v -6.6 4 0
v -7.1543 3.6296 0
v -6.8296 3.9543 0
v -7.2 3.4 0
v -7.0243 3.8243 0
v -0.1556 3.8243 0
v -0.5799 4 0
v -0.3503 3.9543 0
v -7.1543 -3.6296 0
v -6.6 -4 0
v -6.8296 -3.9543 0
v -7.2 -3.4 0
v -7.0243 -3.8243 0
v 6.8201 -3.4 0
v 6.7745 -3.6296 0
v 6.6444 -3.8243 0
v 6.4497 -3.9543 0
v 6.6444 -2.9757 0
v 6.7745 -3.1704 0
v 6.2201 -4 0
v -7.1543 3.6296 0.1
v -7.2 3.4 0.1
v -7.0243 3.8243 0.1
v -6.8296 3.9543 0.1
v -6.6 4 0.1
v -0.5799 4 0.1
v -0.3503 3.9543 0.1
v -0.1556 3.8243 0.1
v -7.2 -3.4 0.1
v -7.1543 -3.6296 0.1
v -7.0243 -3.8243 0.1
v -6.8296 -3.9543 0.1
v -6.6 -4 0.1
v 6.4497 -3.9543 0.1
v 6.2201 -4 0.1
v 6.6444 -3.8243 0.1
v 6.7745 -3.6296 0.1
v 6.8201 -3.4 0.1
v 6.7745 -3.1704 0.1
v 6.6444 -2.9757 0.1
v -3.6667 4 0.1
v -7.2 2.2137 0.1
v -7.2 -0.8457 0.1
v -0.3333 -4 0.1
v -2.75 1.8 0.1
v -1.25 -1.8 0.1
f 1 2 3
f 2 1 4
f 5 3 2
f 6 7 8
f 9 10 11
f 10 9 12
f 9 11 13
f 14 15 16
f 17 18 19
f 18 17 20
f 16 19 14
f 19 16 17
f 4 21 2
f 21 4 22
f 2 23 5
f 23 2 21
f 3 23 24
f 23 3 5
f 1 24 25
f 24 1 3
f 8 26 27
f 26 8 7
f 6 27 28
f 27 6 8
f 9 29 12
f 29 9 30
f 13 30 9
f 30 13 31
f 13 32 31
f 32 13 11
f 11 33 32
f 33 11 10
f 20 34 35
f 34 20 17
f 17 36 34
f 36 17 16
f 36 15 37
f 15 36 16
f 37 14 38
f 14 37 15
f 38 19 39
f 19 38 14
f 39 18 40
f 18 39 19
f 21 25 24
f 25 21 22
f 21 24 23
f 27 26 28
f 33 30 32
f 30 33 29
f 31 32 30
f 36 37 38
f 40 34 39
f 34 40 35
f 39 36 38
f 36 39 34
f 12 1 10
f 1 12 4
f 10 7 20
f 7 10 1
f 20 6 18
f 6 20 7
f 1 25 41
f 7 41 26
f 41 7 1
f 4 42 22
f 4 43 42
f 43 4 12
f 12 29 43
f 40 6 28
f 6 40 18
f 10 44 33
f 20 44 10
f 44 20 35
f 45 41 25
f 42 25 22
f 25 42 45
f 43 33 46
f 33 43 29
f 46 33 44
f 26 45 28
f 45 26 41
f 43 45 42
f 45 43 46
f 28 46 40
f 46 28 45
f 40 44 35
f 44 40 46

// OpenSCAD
// file: ../p/3-8cyli.scad
use <../lib.scad>
function ldraw_lib__3_8cyli() = [
// 0 Cylinder 0.375
// 0 Name: 3-8cyli.dat
// 0 Author: James Jessiman
// 0 !LDRAW_ORG Primitive UPDATE 2005-01
// 0 !LICENSE Licensed under CC BY 4.0 : see CAreadme.txt
// 
// 0 BFC CERTIFY CCW
  [0,"BFC","CERTIFY"],
  [0,"BFC","CCW"],
// 
// 0 !HISTORY 2002-05-08 [OrionP] Made BFC compliant
// 0 !HISTORY 2002-08-18 [PTadmin] Official Update 2002-04
// 0 !HISTORY 2004-12-11 [nielsk] Recreated using Primitive Generator, Edge lines fixed, BFC changed to CCW
// 0 !HISTORY 2005-12-28 [PTadmin] Official Update 2005-01
// 0 !HISTORY 2007-06-24 [PTadmin] Header formatted for Contributor Agreement
// 0 !HISTORY 2008-07-01 [PTadmin] Official Update 2008-01
// 
// 
// 4 16 .9239 1 .3827 .9239 0 .3827 1 0 0 1 1 0
  [4,16,.9239,1,.3827,.9239,0,.3827,1,0,0,1,1,0],
// 4 16 .7071 1 .7071 .7071 0 .7071 .9239 0 .3827 .9239 1 .3827
  [4,16,.7071,1,.7071,.7071,0,.7071,.9239,0,.3827,.9239,1,.3827],
// 4 16 .3827 1 .9239 .3827 0 .9239 .7071 0 .7071 .7071 1 .7071
  [4,16,.3827,1,.9239,.3827,0,.9239,.7071,0,.7071,.7071,1,.7071],
// 4 16 0 1 1 0 0 1 .3827 0 .9239 .3827 1 .9239
  [4,16,0,1,1,0,0,1,.3827,0,.9239,.3827,1,.9239],
// 4 16 -.3827 1 .9239 -.3827 0 .9239 0 0 1 0 1 1
  [4,16,-.3827,1,.9239,-.3827,0,.9239,0,0,1,0,1,1],
// 4 16 -.7071 1 .7071 -.7071 0 .7071 -.3827 0 .9239 -.3827 1 .9239
  [4,16,-.7071,1,.7071,-.7071,0,.7071,-.3827,0,.9239,-.3827,1,.9239],
// 5 24 1 1 0 1 0 0 1 1 -.4142 .9239 1 .3827
  [5,24,1,1,0,1,0,0,1,1,-.4142,.9239,1,.3827],
// 5 24 .9239 1 .3827 .9239 0 .3827 1 1 0 .7071 1 .7071
  [5,24,.9239,1,.3827,.9239,0,.3827,1,1,0,.7071,1,.7071],
// 5 24 .7071 1 .7071 .7071 0 .7071 .9239 1 .3827 .3827 1 .9239
  [5,24,.7071,1,.7071,.7071,0,.7071,.9239,1,.3827,.3827,1,.9239],
// 5 24 .3827 1 .9239 .3827 0 .9239 .7071 1 .7071 0 1 1
  [5,24,.3827,1,.9239,.3827,0,.9239,.7071,1,.7071,0,1,1],
// 5 24 0 1 1 0 0 1 .3827 1 .9239 -.3827 1 .9239
  [5,24,0,1,1,0,0,1,.3827,1,.9239,-.3827,1,.9239],
// 5 24 -.3827 1 .9239 -.3827 0 .9239 0 1 1 -.7071 1 .7071
  [5,24,-.3827,1,.9239,-.3827,0,.9239,0,1,1,-.7071,1,.7071],
// 5 24 -.7071 1 .7071 -.7071 0 .7071 -.3827 1 .9239 -1 1 .4142
  [5,24,-.7071,1,.7071,-.7071,0,.7071,-.3827,1,.9239,-1,1,.4142],
// 0
];
module ldraw_lib__3_8cyli(step=0, col=false, unit=2/5, alt=false, line=0.2, solid=!$preview)
    makepoly(ldraw_lib__3_8cyli(), step=step, col=col, unit=unit, alt=alt, line=line, solid=solid);
ldraw_lib__3_8cyli(line=0.2);
// file: ../p/3-8chrd.scad
use <../lib.scad>
function ldraw_lib__3_8chrd() = [
// 0 Chord 0.375
// 0 Name: 3-8chrd.dat
// 0 Author: Donald Sutter [technog]
// 0 !LDRAW_ORG Primitive UPDATE 2005-01
// 0 !LICENSE Licensed under CC BY 4.0 : see CAreadme.txt
// 
// 0 BFC CERTIFY CCW
  [0,"BFC","CERTIFY"],
  [0,"BFC","CCW"],
// 
// 0 !HISTORY 2004-01-07 [Steffen] added primitive code for POVray
// 0 !HISTORY 2004-03-18 [mkennedy] removed pov code and rearanged polygons.
// 0 !HISTORY 2004-09-12 [cwdee] reversed winding and standardised precision
// 0 !HISTORY 2005-12-28 [PTadmin] Official Update 2005-01
// 0 !HISTORY 2007-06-24 [PTadmin] Header formatted for Contributor Agreement
// 0 !HISTORY 2008-07-01 [PTadmin] Official Update 2008-01
// 
// 
// 3 16 0.7071 0 0.7071 0.3827 0 0.9239 0 0 1
  [3,16,0.7071,0,0.7071,0.3827,0,0.9239,0,0,1],
// 4 16 0.9239 0 0.3827 -0.3827 0 0.9239 -0.7071 0 0.7071 1 0 0
  [4,16,0.9239,0,0.3827,-0.3827,0,0.9239,-0.7071,0,0.7071,1,0,0],
// 4 16 0.7071 0 0.7071 0 0 1 -0.3827 0 0.9239 0.9239 0 0.3827
  [4,16,0.7071,0,0.7071,0,0,1,-0.3827,0,0.9239,0.9239,0,0.3827],
// 0
];
module ldraw_lib__3_8chrd(step=0, col=false, unit=2/5, alt=false, line=0.2, solid=!$preview)
    makepoly(ldraw_lib__3_8chrd(), step=step, col=col, unit=unit, alt=alt, line=line, solid=solid);
ldraw_lib__3_8chrd(line=0.2);
// file: ../p/1-8cyli.scad
use <../lib.scad>
function ldraw_lib__1_8cyli() = [
// 0 Cylinder 0.125
// 0 Name: 1-8cyli.dat
// 0 Author: James Jessiman
// 0 !LDRAW_ORG Primitive UPDATE 2005-01
// 0 !LICENSE Licensed under CC BY 4.0 : see CAreadme.txt
// 
// 0 BFC CERTIFY CCW
  [0,"BFC","CERTIFY"],
  [0,"BFC","CCW"],
// 
// 0 !HISTORY 2002-04-25 [PTadmin] Official Update 2002-02
// 0 !HISTORY 2004-12-11 [nielsk] Recreated using Primitive Generator, Edge lines fixed, BFC changed to CCW
// 0 !HISTORY 2005-12-28 [PTadmin] Official Update 2005-01
// 0 !HISTORY 2007-06-22 [PTadmin] Header formatted for Contributor Agreement
// 0 !HISTORY 2008-07-01 [PTadmin] Official Update 2008-01
// 
// 
// 4 16 .9239 1 .3827 .9239 0 .3827 1 0 0 1 1 0
  [4,16,.9239,1,.3827,.9239,0,.3827,1,0,0,1,1,0],
// 4 16 .7071 1 .7071 .7071 0 .7071 .9239 0 .3827 .9239 1 .3827
  [4,16,.7071,1,.7071,.7071,0,.7071,.9239,0,.3827,.9239,1,.3827],
// 5 24 1 1 0 1 0 0 1 1 -.4142 .9239 1 .3827
  [5,24,1,1,0,1,0,0,1,1,-.4142,.9239,1,.3827],
// 5 24 .9239 1 .3827 .9239 0 .3827 1 1 0 .7071 1 .7071
  [5,24,.9239,1,.3827,.9239,0,.3827,1,1,0,.7071,1,.7071],
// 5 24 .7071 1 .7071 .7071 0 .7071 .9239 1 .3827 .4142 1 1
  [5,24,.7071,1,.7071,.7071,0,.7071,.9239,1,.3827,.4142,1,1],
// 0
];
module ldraw_lib__1_8cyli(step=0, col=false, unit=2/5, alt=false, line=0.2, solid=!$preview)
    makepoly(ldraw_lib__1_8cyli(), step=step, col=col, unit=unit, alt=alt, line=line, solid=solid);
ldraw_lib__1_8cyli(line=0.2);
// file: ../p/1-8chrd.scad
use <../lib.scad>
function ldraw_lib__1_8chrd() = [
// 0 Chord 0.125
// 0 Name: 1-8chrd.dat
// 0 Author: Orion Pobursky [OrionP]
// 0 !LDRAW_ORG Primitive UPDATE 2023-05
// 0 !LICENSE Licensed under CC BY 4.0 : see CAreadme.txt
// 
// 0 BFC CERTIFY CCW
  [0,"BFC","CERTIFY"],
  [0,"BFC","CCW"],
// 
// 0 !HISTORY 2004-04-22 [PTadmin] Official Update 2004-02
// 0 !HISTORY 2007-06-22 [PTadmin] Header formatted for Contributor Agreement
// 0 !HISTORY 2008-07-01 [PTadmin] Official Update 2008-01
// 0 !HISTORY 2023-10-27 [OrionP] Rebuilt with PrimGen2, original author westrate
// 0 !HISTORY 2023-10-31 [OrionP] Official Update 2023-05
// 
// 3 16 1 0 0 0.9239 0 0.3827 0.7071 0 0.7071
  [3,16,1,0,0,0.9239,0,0.3827,0.7071,0,0.7071],
];
module ldraw_lib__1_8chrd(step=0, col=false, unit=2/5, alt=false, line=0.2, solid=!$preview)
    makepoly(ldraw_lib__1_8chrd(), step=step, col=col, unit=unit, alt=alt, line=line, solid=solid);
ldraw_lib__1_8chrd(line=0.2);
// file: ../p/1-4cyli.scad
use <../lib.scad>
function ldraw_lib__1_4cyli() = [
// 0 Cylinder 0.25
// 0 Name: 1-4cyli.dat
// 0 Author: James Jessiman
// 0 !LDRAW_ORG Primitive UPDATE 2012-01
// 0 !LICENSE Licensed under CC BY 4.0 : see CAreadme.txt
// 
// 0 BFC CERTIFY CCW
  [0,"BFC","CERTIFY"],
  [0,"BFC","CCW"],
// 
// 0 !HISTORY 2002-03-23 [sbliss] Added BFC statement.
// 0 !HISTORY 2002-04-25 [PTadmin] Official Update 2002-02
// 0 !HISTORY 2007-06-22 [PTadmin] Header formatted for Contributor Agreement
// 0 !HISTORY 2008-07-01 [PTadmin] Official Update 2008-01
// 0 !HISTORY 2012-02-16 [Philo] Changed to CCW
// 0 !HISTORY 2012-03-30 [PTadmin] Official Update 2012-01
// 
// 
// 4 16 1 1 0 0.9239 1 0.3827 0.9239 0 0.3827 1 0 0
  [4,16,1,1,0,0.9239,1,0.3827,0.9239,0,0.3827,1,0,0],
// 5 24 1 0 0 1 1 0 0.9239 0 0.3827 1 0 -1
  [5,24,1,0,0,1,1,0,0.9239,0,0.3827,1,0,-1],
// 4 16 0.9239 1 0.3827 0.7071 1 0.7071 0.7071 0 0.7071 0.9239 0 0.3827
  [4,16,0.9239,1,0.3827,0.7071,1,0.7071,0.7071,0,0.7071,0.9239,0,0.3827],
// 5 24 0.9239 0 0.3827 0.9239 1 0.3827 0.7071 0 0.7071 1 0 0
  [5,24,0.9239,0,0.3827,0.9239,1,0.3827,0.7071,0,0.7071,1,0,0],
// 4 16 0.7071 1 0.7071 0.3827 1 0.9239 0.3827 0 0.9239 0.7071 0 0.7071
  [4,16,0.7071,1,0.7071,0.3827,1,0.9239,0.3827,0,0.9239,0.7071,0,0.7071],
// 5 24 0.7071 0 0.7071 0.7071 1 0.7071 0.3827 0 0.9239 0.9239 0 0.3827
  [5,24,0.7071,0,0.7071,0.7071,1,0.7071,0.3827,0,0.9239,0.9239,0,0.3827],
// 4 16 0.3827 1 0.9239 0 1 1 0 0 1 0.3827 0 0.9239
  [4,16,0.3827,1,0.9239,0,1,1,0,0,1,0.3827,0,0.9239],
// 5 24 0.3827 0 0.9239 0.3827 1 0.9239 0 0 1 0.7071 0 0.7071
  [5,24,0.3827,0,0.9239,0.3827,1,0.9239,0,0,1,0.7071,0,0.7071],
// 5 24 0 0 1 0 1 1 0.3827 0 0.9239 -1 0 1
  [5,24,0,0,1,0,1,1,0.3827,0,0.9239,-1,0,1],
];
module ldraw_lib__1_4cyli(step=0, col=false, unit=2/5, alt=false, line=0.2, solid=!$preview)
    makepoly(ldraw_lib__1_4cyli(), step=step, col=col, unit=unit, alt=alt, line=line, solid=solid);
ldraw_lib__1_4cyli(line=0.2);
// file: ../p/1-4chrd.scad
use <../lib.scad>
function ldraw_lib__1_4chrd() = [
// 0 Chord 0.25
// 0 Name: 1-4chrd.dat
// 0 Author: Max Martin Richter [MMR1988]
// 0 !LDRAW_ORG Primitive UPDATE 2023-05
// 0 !LICENSE Licensed under CC BY 4.0 : see CAreadme.txt
// 
// 0 BFC CERTIFY CCW
  [0,"BFC","CERTIFY"],
  [0,"BFC","CCW"],
// 
// 0 !HISTORY 2004-04-22 [PTadmin] Official Update 2004-02
// 0 !HISTORY 2007-10-09 [PTadmin] Header formatted for Contributor Agreement
// 0 !HISTORY 2008-07-01 [PTadmin] Official Update 2008-01
// 0 !HISTORY 2012-08-02 [MMR1988] Re-creation with PrimGen2 and Rectifier
// 0 !HISTORY 2012-08-09 [PTadmin] Official Update 2012-02
// 0 !HISTORY 2023-10-27 [OrionP] Change author to MMR1988 from hafhead
// 0 !HISTORY 2023-10-31 [OrionP] Official Update 2023-05
// 
// 4 16 0.9239 0 0.3827 0.3827 0 0.9239 0 0 1 1 0 0
  [4,16,0.9239,0,0.3827,0.3827,0,0.9239,0,0,1,1,0,0],
// 3 16 0.7071 0 0.7071 0.3827 0 0.9239 0.9239 0 0.3827
  [3,16,0.7071,0,0.7071,0.3827,0,0.9239,0.9239,0,0.3827],
];
module ldraw_lib__1_4chrd(step=0, col=false, unit=2/5, alt=false, line=0.2, solid=!$preview)
    makepoly(ldraw_lib__1_4chrd(), step=step, col=col, unit=unit, alt=alt, line=line, solid=solid);
ldraw_lib__1_4chrd(line=0.2);
// main file
use <../lib.scad>
use <../p/1-4chrd.scad>
use <../p/1-4cyli.scad>
use <../p/1-8chrd.scad>
use <../p/1-8cyli.scad>
use <../p/3-8chrd.scad>
use <../p/3-8cyli.scad>
function ldraw_lib__6148328aa() = [
// 0 Sticker  1.0 x  1.8 with Red Trapezoids on White Background Right
// 0 Name: 6148328aa.dat
// 0 Author: Massimo Maso [Sirio]
// 0 !LDRAW_ORG Part UPDATE 2024-01
// 0 !LICENSE Licensed under CC BY 4.0 : see CAreadme.txt
// 
// 0 BFC CERTIFY CCW
  [0,"BFC","CERTIFY"],
  [0,"BFC","CCW"],
// 
// 0 !KEYWORDS 917K, Bricklink 75876stk01, Brickowl 852010, Pit Lane, Porsche
// 0 !KEYWORDS Rebrickable 26357, set 75876, Speed Champions
// 
// 0 !HISTORY 2024-01-29 [OrionP] Official Update 2024-01
// 
// 
// 0 // Primitives
// 
// 1 16 -16.5 0 8.5 -1.5 0 0 0 -1 0 0 0 1.5 1-4chrd.dat
  [1,16,-16.5,0,8.5,-1.5,0,0,0,-1,0,0,0,1.5, ldraw_lib__1_4chrd()],
// 1 16 -1.4497 0 8.5 0 0 1.5 0 -1 0 1.5 0 0 1-8chrd.dat
  [1,16,-1.4497,0,8.5,0,0,1.5,0,-1,0,1.5,0,0, ldraw_lib__1_8chrd()],
// 1 16 -16.5 0 -8.5 -1.5 0 0 0 -1 0 0 0 -1.5 1-4chrd.dat
  [1,16,-16.5,0,-8.5,-1.5,0,0,0,-1,0,0,0,-1.5, ldraw_lib__1_4chrd()],
// 1 16 15.5503 0 -8.5 0 0 1.5 0 -1 0 -1.5 0 0 3-8chrd.dat
  [1,16,15.5503,0,-8.5,0,0,1.5,0,-1,0,-1.5,0,0, ldraw_lib__3_8chrd()],
// 1 16 -16.5 0 8.5 -1.5 0 0 0 -.25 0 0 0 1.5 1-4cyli.dat
  [1,16,-16.5,0,8.5,-1.5,0,0,0,-.25,0,0,0,1.5, ldraw_lib__1_4cyli()],
// 1 16 -1.4497 0 8.5 0 0 1.5 0 -.25 0 1.5 0 0 1-8cyli.dat
  [1,16,-1.4497,0,8.5,0,0,1.5,0,-.25,0,1.5,0,0, ldraw_lib__1_8cyli()],
// 1 16 -16.5 0 -8.5 -1.5 0 0 0 -.25 0 0 0 -1.5 1-4cyli.dat
  [1,16,-16.5,0,-8.5,-1.5,0,0,0,-.25,0,0,0,-1.5, ldraw_lib__1_4cyli()],
// 1 16 15.5503 0 -8.5 0 0 1.5 0 -.25 0 -1.5 0 0 3-8cyli.dat
  [1,16,15.5503,0,-8.5,0,0,1.5,0,-.25,0,-1.5,0,0, ldraw_lib__3_8cyli()],
// 1 4 -16.5 -.25 8.5 -1.5 0 0 0 1 0 0 0 1.5 1-4chrd.dat
  [1,4,-16.5,-.25,8.5,-1.5,0,0,0,1,0,0,0,1.5, ldraw_lib__1_4chrd()],
// 1 15 -1.4497 -.25 8.5 0 0 1.5 0 1 0 1.5 0 0 1-8chrd.dat
  [1,15,-1.4497,-.25,8.5,0,0,1.5,0,1,0,1.5,0,0, ldraw_lib__1_8chrd()],
// 1 4 -16.5 -.25 -8.5 -1.5 0 0 0 1 0 0 0 -1.5 1-4chrd.dat
  [1,4,-16.5,-.25,-8.5,-1.5,0,0,0,1,0,0,0,-1.5, ldraw_lib__1_4chrd()],
// 1 15 15.5503 -.25 -8.5 0 0 1.5 0 1 0 -1.5 0 0 3-8chrd.dat
  [1,15,15.5503,-.25,-8.5,0,0,1.5,0,1,0,-1.5,0,0, ldraw_lib__3_8chrd()],
// 0 // Bottom faces
// 4 16 -16.5 0 10 -16.5 0 -10 -18 0 -8.5 -18 0 8.5
  [4,16,-16.5,0,10,-16.5,0,-10,-18,0,-8.5,-18,0,8.5],
// 4 16 -16.5 0 10 -1.4497 0 10 15.5503 0 -10 -16.5 0 -10
  [4,16,-16.5,0,10,-1.4497,0,10,15.5503,0,-10,-16.5,0,-10],
// 4 16 -1.4497 0 10 -.38905 0 9.56065 16.61095 0 -7.43935 15.5503 0 -10
  [4,16,-1.4497,0,10,-.38905,0,9.56065,16.61095,0,-7.43935,15.5503,0,-10],
// 0 // Lateral faces
// 3 16 -16.5 0 10 -16.5 -.25 10 -9.1667 -.25 10
  [3,16,-16.5,0,10,-16.5,-.25,10,-9.1667,-.25,10],
// 4 16 -16.5 0 10 -9.1667 -.25 10 -1.4497 -.25 10 -1.4497 0 10
  [4,16,-16.5,0,10,-9.1667,-.25,10,-1.4497,-.25,10,-1.4497,0,10],
// 3 16 -18 0 8.5 -18 -.25 5.5343 -18 -.25 8.5
  [3,16,-18,0,8.5,-18,-.25,5.5343,-18,-.25,8.5],
// 4 16 -18 0 8.5 -18 0 -8.5 -18 -.25 -2.1143 -18 -.25 5.5343
  [4,16,-18,0,8.5,-18,0,-8.5,-18,-.25,-2.1143,-18,-.25,5.5343],
// 3 16 -18 0 -8.5 -18 -.25 -8.5 -18 -.25 -2.1143
  [3,16,-18,0,-8.5,-18,-.25,-8.5,-18,-.25,-2.1143],
// 4 16 -.38905 0 9.56065 -.38905 -.25 9.56065 16.61095 -.25 -7.43935 16.61095 0 -7.43935
  [4,16,-.38905,0,9.56065,-.38905,-.25,9.56065,16.61095,-.25,-7.43935,16.61095,0,-7.43935],
// 3 16 -16.5 0 -10 -.8333 -.25 -10 -16.5 -.25 -10
  [3,16,-16.5,0,-10,-.8333,-.25,-10,-16.5,-.25,-10],
// 4 16 -16.5 0 -10 15.5503 0 -10 15.5503 -.25 -10 -.8333 -.25 -10
  [4,16,-16.5,0,-10,15.5503,0,-10,15.5503,-.25,-10,-.8333,-.25,-10],
// 0 // Top faces
// 0 // Red faces
// 3 4 -6.875 -.25 4.5 -9.1667 -.25 10 -16.5 -.25 10
  [3,4,-6.875,-.25,4.5,-9.1667,-.25,10,-16.5,-.25,10],
// 4 4 -6.875 -.25 4.5 -16.5 -.25 10 -18 -.25 8.5 -18 -.25 5.5343
  [4,4,-6.875,-.25,4.5,-16.5,-.25,10,-18,-.25,8.5,-18,-.25,5.5343],
// 4 4 -3.125 -.25 -4.5 -18 -.25 -2.1143 -18 -.25 -8.5 -16.5 -.25 -10
  [4,4,-3.125,-.25,-4.5,-18,-.25,-2.1143,-18,-.25,-8.5,-16.5,-.25,-10],
// 3 4 -3.125 -.25 -4.5 -16.5 -.25 -10 -.8333 -.25 -10
  [3,4,-3.125,-.25,-4.5,-16.5,-.25,-10,-.8333,-.25,-10],
// 0 // White faces
// 4 15 -6.875 -.25 4.5 -.38905 -.25 9.56065 -1.4497 -.25 10 -9.1667 -.25 10
  [4,15,-6.875,-.25,4.5,-.38905,-.25,9.56065,-1.4497,-.25,10,-9.1667,-.25,10],
// 4 15 -6.875 -.25 4.5 -18 -.25 5.5343 -18 -.25 -2.1143 -3.125 -.25 -4.5
  [4,15,-6.875,-.25,4.5,-18,-.25,5.5343,-18,-.25,-2.1143,-3.125,-.25,-4.5],
// 4 15 -6.875 -.25 4.5 -3.125 -.25 -4.5 16.61095 -.25 -7.43935 -.38905 -.25 9.56065
  [4,15,-6.875,-.25,4.5,-3.125,-.25,-4.5,16.61095,-.25,-7.43935,-.38905,-.25,9.56065],
// 4 15 16.61095 -.25 -7.43935 -3.125 -.25 -4.5 -.8333 -.25 -10 15.5503 -.25 -10
  [4,15,16.61095,-.25,-7.43935,-3.125,-.25,-4.5,-.8333,-.25,-10,15.5503,-.25,-10],
];
module ldraw_lib__6148328aa(step=0, col=false, unit=2/5, alt=false, line=0.2, solid=!$preview)
    makepoly(ldraw_lib__6148328aa(), step=step, col=col, unit=unit, alt=alt, line=line, solid=solid);
ldraw_lib__6148328aa(line=0.2);
